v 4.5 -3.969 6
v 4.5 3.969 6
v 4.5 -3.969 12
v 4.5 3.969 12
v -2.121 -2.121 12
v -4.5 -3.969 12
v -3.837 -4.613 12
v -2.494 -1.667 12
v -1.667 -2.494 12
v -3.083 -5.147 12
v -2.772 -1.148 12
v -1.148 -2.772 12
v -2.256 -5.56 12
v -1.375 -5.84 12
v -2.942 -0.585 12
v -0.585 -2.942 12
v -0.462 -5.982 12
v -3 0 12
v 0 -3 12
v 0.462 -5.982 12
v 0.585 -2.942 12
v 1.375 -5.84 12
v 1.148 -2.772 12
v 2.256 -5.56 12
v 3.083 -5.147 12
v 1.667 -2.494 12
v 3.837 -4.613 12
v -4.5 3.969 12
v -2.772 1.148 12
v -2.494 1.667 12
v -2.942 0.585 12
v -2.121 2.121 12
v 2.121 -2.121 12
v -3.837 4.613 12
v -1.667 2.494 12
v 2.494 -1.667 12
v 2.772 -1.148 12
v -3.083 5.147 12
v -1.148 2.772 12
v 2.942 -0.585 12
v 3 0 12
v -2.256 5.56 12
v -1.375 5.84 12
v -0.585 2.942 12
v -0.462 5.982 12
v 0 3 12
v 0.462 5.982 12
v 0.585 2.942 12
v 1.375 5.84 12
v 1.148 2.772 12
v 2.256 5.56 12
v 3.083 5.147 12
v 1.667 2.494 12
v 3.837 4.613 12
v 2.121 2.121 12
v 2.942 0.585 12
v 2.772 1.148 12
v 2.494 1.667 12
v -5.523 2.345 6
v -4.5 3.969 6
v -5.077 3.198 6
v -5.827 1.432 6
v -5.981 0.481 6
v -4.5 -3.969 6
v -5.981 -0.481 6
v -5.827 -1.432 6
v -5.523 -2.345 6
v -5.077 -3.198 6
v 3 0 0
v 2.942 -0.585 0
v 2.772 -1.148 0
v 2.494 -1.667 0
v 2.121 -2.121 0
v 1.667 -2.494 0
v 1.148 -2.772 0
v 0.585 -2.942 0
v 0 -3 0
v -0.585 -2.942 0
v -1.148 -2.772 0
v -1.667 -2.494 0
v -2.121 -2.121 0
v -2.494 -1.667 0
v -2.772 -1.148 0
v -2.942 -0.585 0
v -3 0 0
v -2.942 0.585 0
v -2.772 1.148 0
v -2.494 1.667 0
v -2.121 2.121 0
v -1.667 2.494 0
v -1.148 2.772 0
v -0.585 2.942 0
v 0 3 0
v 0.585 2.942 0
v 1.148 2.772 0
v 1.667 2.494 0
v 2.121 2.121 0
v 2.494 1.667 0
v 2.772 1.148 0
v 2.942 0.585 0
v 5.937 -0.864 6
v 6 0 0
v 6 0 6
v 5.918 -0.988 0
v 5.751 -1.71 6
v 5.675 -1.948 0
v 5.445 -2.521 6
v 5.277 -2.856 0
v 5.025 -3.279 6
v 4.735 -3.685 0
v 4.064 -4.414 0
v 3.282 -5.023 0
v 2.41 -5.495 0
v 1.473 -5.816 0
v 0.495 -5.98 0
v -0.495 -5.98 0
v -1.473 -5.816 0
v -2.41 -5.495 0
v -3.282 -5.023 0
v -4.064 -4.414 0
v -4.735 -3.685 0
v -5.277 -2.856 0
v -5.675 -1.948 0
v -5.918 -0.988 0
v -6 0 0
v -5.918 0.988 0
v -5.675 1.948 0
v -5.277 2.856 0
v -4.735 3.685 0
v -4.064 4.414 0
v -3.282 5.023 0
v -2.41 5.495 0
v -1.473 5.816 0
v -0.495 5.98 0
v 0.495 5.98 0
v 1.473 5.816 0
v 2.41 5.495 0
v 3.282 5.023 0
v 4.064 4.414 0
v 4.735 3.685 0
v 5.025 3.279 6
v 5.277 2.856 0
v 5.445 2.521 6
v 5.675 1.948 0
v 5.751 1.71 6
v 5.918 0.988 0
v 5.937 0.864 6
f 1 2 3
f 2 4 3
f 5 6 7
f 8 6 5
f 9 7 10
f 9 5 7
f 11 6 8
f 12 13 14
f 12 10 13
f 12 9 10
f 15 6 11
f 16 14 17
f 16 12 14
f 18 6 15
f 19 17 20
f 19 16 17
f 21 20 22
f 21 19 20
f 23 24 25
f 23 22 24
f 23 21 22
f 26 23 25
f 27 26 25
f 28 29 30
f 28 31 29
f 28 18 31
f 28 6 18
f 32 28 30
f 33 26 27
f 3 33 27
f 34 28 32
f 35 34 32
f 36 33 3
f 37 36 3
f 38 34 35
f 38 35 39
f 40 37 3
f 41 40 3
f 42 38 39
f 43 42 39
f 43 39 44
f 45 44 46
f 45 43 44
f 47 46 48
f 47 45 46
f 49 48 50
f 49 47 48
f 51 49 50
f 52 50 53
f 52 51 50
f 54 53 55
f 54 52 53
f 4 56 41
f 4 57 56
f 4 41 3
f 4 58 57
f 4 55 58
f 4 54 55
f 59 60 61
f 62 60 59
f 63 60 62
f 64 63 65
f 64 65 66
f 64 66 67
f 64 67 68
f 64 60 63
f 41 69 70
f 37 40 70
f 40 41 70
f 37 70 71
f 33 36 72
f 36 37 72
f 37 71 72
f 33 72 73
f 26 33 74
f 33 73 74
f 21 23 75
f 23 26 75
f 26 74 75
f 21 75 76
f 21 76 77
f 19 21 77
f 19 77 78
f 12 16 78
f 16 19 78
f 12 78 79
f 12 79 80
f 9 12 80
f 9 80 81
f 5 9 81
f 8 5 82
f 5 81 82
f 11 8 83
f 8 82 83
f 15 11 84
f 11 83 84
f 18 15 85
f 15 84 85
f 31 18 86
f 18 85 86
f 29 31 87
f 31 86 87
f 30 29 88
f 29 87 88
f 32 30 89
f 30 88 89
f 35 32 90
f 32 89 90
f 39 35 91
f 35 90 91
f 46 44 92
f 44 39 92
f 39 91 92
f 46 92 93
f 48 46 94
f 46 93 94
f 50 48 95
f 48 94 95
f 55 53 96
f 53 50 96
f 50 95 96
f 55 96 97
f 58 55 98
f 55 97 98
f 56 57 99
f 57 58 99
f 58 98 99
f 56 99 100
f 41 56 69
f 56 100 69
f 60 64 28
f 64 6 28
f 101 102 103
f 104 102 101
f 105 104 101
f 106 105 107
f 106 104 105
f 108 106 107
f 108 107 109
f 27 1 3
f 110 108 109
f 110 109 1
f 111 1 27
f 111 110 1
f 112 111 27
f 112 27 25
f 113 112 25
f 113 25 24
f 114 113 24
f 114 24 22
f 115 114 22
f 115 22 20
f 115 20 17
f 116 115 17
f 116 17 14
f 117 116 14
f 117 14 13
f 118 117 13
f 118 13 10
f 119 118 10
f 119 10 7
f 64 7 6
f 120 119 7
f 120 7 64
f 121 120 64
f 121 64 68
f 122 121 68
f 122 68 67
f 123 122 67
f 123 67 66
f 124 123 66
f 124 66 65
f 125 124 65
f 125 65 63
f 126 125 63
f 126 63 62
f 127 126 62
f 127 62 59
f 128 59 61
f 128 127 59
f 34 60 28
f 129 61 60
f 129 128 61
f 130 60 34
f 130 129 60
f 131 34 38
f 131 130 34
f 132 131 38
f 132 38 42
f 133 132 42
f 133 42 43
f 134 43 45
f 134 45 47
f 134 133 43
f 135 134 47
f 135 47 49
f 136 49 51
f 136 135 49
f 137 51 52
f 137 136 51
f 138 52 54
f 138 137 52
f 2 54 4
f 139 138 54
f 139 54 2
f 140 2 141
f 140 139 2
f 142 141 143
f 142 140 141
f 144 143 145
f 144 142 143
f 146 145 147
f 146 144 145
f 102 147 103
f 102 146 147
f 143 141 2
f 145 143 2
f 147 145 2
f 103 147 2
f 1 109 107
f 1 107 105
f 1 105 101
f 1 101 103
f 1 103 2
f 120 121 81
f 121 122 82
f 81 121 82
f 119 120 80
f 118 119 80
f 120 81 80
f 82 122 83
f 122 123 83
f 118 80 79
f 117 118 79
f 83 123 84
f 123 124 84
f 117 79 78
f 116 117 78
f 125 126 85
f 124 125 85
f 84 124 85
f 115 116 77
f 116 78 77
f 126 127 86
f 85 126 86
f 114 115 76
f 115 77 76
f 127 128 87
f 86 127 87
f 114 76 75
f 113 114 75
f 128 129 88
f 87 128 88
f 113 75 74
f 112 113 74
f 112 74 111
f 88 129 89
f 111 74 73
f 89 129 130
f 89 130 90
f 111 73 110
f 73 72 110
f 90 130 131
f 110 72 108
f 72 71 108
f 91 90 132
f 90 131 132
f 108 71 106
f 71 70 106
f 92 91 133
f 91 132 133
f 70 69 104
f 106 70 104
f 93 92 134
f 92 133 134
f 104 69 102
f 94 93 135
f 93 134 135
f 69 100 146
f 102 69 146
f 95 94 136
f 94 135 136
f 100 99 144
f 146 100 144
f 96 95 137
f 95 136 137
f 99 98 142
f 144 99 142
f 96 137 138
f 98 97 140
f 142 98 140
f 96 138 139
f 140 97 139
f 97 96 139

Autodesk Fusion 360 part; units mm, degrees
sketch "Esquisse1" plane through (0, 0, 0) normal (0, 0, 1) x (1, 0, 0)
  circle A0 centre (0, 0) radius 3
  circle A1 centre (0, 0) radius 6
  line L0 (-4.5, 8.8472) -> (4.5, 8.8472) construction
  line L1 (4.5, 8.8472) -> (4.5, -9.3481) construction
  line L2 (4.5, -9.3481) -> (-4.5, -9.3481) construction
  line L3 (-4.5, -9.3481) -> (-4.5, 8.8472) construction
  line L4 (4.5, 3.9686) -> (4.5, -3.9686)
  line L5 (-4.5, 3.9686) -> (-4.5, -3.9686)
  dimension "d1" = 6
  dimension "d2" = 12
  dimension "d3" = 9
  dimension "d4" = 4.5
extrude "Extrusion3" add sketch "Esquisse1" along normal blind 12
sketch "Esquisse2" plane through (0, 0, 12) normal (0, 0, 1) x (-1, 0, 0)
  circle A0 centre (0, 0) radius 3
  circle A1 centre (0, 0) radius 6
  line L0 (4.5, -8.2141) -> (-4.5, -8.2141) construction
  line L1 (-4.5, -8.2141) -> (-4.5, 8.5) construction
  line L2 (-4.5, 8.5) -> (4.5, 8.5) construction
  line L3 (4.5, 8.5) -> (4.5, -8.2141) construction
  line L4 (4.5, 3.9686) -> (4.5, -3.9686)
  line L5 (-4.5, -3.9686) -> (-4.5, 3.9686)
  dimension "d12" = 9
  dimension "d13" = 4.5
extrude "Extrusion4" cut sketch "Esquisse2" against normal blind 6 contours A1 L4 | A1 L5
